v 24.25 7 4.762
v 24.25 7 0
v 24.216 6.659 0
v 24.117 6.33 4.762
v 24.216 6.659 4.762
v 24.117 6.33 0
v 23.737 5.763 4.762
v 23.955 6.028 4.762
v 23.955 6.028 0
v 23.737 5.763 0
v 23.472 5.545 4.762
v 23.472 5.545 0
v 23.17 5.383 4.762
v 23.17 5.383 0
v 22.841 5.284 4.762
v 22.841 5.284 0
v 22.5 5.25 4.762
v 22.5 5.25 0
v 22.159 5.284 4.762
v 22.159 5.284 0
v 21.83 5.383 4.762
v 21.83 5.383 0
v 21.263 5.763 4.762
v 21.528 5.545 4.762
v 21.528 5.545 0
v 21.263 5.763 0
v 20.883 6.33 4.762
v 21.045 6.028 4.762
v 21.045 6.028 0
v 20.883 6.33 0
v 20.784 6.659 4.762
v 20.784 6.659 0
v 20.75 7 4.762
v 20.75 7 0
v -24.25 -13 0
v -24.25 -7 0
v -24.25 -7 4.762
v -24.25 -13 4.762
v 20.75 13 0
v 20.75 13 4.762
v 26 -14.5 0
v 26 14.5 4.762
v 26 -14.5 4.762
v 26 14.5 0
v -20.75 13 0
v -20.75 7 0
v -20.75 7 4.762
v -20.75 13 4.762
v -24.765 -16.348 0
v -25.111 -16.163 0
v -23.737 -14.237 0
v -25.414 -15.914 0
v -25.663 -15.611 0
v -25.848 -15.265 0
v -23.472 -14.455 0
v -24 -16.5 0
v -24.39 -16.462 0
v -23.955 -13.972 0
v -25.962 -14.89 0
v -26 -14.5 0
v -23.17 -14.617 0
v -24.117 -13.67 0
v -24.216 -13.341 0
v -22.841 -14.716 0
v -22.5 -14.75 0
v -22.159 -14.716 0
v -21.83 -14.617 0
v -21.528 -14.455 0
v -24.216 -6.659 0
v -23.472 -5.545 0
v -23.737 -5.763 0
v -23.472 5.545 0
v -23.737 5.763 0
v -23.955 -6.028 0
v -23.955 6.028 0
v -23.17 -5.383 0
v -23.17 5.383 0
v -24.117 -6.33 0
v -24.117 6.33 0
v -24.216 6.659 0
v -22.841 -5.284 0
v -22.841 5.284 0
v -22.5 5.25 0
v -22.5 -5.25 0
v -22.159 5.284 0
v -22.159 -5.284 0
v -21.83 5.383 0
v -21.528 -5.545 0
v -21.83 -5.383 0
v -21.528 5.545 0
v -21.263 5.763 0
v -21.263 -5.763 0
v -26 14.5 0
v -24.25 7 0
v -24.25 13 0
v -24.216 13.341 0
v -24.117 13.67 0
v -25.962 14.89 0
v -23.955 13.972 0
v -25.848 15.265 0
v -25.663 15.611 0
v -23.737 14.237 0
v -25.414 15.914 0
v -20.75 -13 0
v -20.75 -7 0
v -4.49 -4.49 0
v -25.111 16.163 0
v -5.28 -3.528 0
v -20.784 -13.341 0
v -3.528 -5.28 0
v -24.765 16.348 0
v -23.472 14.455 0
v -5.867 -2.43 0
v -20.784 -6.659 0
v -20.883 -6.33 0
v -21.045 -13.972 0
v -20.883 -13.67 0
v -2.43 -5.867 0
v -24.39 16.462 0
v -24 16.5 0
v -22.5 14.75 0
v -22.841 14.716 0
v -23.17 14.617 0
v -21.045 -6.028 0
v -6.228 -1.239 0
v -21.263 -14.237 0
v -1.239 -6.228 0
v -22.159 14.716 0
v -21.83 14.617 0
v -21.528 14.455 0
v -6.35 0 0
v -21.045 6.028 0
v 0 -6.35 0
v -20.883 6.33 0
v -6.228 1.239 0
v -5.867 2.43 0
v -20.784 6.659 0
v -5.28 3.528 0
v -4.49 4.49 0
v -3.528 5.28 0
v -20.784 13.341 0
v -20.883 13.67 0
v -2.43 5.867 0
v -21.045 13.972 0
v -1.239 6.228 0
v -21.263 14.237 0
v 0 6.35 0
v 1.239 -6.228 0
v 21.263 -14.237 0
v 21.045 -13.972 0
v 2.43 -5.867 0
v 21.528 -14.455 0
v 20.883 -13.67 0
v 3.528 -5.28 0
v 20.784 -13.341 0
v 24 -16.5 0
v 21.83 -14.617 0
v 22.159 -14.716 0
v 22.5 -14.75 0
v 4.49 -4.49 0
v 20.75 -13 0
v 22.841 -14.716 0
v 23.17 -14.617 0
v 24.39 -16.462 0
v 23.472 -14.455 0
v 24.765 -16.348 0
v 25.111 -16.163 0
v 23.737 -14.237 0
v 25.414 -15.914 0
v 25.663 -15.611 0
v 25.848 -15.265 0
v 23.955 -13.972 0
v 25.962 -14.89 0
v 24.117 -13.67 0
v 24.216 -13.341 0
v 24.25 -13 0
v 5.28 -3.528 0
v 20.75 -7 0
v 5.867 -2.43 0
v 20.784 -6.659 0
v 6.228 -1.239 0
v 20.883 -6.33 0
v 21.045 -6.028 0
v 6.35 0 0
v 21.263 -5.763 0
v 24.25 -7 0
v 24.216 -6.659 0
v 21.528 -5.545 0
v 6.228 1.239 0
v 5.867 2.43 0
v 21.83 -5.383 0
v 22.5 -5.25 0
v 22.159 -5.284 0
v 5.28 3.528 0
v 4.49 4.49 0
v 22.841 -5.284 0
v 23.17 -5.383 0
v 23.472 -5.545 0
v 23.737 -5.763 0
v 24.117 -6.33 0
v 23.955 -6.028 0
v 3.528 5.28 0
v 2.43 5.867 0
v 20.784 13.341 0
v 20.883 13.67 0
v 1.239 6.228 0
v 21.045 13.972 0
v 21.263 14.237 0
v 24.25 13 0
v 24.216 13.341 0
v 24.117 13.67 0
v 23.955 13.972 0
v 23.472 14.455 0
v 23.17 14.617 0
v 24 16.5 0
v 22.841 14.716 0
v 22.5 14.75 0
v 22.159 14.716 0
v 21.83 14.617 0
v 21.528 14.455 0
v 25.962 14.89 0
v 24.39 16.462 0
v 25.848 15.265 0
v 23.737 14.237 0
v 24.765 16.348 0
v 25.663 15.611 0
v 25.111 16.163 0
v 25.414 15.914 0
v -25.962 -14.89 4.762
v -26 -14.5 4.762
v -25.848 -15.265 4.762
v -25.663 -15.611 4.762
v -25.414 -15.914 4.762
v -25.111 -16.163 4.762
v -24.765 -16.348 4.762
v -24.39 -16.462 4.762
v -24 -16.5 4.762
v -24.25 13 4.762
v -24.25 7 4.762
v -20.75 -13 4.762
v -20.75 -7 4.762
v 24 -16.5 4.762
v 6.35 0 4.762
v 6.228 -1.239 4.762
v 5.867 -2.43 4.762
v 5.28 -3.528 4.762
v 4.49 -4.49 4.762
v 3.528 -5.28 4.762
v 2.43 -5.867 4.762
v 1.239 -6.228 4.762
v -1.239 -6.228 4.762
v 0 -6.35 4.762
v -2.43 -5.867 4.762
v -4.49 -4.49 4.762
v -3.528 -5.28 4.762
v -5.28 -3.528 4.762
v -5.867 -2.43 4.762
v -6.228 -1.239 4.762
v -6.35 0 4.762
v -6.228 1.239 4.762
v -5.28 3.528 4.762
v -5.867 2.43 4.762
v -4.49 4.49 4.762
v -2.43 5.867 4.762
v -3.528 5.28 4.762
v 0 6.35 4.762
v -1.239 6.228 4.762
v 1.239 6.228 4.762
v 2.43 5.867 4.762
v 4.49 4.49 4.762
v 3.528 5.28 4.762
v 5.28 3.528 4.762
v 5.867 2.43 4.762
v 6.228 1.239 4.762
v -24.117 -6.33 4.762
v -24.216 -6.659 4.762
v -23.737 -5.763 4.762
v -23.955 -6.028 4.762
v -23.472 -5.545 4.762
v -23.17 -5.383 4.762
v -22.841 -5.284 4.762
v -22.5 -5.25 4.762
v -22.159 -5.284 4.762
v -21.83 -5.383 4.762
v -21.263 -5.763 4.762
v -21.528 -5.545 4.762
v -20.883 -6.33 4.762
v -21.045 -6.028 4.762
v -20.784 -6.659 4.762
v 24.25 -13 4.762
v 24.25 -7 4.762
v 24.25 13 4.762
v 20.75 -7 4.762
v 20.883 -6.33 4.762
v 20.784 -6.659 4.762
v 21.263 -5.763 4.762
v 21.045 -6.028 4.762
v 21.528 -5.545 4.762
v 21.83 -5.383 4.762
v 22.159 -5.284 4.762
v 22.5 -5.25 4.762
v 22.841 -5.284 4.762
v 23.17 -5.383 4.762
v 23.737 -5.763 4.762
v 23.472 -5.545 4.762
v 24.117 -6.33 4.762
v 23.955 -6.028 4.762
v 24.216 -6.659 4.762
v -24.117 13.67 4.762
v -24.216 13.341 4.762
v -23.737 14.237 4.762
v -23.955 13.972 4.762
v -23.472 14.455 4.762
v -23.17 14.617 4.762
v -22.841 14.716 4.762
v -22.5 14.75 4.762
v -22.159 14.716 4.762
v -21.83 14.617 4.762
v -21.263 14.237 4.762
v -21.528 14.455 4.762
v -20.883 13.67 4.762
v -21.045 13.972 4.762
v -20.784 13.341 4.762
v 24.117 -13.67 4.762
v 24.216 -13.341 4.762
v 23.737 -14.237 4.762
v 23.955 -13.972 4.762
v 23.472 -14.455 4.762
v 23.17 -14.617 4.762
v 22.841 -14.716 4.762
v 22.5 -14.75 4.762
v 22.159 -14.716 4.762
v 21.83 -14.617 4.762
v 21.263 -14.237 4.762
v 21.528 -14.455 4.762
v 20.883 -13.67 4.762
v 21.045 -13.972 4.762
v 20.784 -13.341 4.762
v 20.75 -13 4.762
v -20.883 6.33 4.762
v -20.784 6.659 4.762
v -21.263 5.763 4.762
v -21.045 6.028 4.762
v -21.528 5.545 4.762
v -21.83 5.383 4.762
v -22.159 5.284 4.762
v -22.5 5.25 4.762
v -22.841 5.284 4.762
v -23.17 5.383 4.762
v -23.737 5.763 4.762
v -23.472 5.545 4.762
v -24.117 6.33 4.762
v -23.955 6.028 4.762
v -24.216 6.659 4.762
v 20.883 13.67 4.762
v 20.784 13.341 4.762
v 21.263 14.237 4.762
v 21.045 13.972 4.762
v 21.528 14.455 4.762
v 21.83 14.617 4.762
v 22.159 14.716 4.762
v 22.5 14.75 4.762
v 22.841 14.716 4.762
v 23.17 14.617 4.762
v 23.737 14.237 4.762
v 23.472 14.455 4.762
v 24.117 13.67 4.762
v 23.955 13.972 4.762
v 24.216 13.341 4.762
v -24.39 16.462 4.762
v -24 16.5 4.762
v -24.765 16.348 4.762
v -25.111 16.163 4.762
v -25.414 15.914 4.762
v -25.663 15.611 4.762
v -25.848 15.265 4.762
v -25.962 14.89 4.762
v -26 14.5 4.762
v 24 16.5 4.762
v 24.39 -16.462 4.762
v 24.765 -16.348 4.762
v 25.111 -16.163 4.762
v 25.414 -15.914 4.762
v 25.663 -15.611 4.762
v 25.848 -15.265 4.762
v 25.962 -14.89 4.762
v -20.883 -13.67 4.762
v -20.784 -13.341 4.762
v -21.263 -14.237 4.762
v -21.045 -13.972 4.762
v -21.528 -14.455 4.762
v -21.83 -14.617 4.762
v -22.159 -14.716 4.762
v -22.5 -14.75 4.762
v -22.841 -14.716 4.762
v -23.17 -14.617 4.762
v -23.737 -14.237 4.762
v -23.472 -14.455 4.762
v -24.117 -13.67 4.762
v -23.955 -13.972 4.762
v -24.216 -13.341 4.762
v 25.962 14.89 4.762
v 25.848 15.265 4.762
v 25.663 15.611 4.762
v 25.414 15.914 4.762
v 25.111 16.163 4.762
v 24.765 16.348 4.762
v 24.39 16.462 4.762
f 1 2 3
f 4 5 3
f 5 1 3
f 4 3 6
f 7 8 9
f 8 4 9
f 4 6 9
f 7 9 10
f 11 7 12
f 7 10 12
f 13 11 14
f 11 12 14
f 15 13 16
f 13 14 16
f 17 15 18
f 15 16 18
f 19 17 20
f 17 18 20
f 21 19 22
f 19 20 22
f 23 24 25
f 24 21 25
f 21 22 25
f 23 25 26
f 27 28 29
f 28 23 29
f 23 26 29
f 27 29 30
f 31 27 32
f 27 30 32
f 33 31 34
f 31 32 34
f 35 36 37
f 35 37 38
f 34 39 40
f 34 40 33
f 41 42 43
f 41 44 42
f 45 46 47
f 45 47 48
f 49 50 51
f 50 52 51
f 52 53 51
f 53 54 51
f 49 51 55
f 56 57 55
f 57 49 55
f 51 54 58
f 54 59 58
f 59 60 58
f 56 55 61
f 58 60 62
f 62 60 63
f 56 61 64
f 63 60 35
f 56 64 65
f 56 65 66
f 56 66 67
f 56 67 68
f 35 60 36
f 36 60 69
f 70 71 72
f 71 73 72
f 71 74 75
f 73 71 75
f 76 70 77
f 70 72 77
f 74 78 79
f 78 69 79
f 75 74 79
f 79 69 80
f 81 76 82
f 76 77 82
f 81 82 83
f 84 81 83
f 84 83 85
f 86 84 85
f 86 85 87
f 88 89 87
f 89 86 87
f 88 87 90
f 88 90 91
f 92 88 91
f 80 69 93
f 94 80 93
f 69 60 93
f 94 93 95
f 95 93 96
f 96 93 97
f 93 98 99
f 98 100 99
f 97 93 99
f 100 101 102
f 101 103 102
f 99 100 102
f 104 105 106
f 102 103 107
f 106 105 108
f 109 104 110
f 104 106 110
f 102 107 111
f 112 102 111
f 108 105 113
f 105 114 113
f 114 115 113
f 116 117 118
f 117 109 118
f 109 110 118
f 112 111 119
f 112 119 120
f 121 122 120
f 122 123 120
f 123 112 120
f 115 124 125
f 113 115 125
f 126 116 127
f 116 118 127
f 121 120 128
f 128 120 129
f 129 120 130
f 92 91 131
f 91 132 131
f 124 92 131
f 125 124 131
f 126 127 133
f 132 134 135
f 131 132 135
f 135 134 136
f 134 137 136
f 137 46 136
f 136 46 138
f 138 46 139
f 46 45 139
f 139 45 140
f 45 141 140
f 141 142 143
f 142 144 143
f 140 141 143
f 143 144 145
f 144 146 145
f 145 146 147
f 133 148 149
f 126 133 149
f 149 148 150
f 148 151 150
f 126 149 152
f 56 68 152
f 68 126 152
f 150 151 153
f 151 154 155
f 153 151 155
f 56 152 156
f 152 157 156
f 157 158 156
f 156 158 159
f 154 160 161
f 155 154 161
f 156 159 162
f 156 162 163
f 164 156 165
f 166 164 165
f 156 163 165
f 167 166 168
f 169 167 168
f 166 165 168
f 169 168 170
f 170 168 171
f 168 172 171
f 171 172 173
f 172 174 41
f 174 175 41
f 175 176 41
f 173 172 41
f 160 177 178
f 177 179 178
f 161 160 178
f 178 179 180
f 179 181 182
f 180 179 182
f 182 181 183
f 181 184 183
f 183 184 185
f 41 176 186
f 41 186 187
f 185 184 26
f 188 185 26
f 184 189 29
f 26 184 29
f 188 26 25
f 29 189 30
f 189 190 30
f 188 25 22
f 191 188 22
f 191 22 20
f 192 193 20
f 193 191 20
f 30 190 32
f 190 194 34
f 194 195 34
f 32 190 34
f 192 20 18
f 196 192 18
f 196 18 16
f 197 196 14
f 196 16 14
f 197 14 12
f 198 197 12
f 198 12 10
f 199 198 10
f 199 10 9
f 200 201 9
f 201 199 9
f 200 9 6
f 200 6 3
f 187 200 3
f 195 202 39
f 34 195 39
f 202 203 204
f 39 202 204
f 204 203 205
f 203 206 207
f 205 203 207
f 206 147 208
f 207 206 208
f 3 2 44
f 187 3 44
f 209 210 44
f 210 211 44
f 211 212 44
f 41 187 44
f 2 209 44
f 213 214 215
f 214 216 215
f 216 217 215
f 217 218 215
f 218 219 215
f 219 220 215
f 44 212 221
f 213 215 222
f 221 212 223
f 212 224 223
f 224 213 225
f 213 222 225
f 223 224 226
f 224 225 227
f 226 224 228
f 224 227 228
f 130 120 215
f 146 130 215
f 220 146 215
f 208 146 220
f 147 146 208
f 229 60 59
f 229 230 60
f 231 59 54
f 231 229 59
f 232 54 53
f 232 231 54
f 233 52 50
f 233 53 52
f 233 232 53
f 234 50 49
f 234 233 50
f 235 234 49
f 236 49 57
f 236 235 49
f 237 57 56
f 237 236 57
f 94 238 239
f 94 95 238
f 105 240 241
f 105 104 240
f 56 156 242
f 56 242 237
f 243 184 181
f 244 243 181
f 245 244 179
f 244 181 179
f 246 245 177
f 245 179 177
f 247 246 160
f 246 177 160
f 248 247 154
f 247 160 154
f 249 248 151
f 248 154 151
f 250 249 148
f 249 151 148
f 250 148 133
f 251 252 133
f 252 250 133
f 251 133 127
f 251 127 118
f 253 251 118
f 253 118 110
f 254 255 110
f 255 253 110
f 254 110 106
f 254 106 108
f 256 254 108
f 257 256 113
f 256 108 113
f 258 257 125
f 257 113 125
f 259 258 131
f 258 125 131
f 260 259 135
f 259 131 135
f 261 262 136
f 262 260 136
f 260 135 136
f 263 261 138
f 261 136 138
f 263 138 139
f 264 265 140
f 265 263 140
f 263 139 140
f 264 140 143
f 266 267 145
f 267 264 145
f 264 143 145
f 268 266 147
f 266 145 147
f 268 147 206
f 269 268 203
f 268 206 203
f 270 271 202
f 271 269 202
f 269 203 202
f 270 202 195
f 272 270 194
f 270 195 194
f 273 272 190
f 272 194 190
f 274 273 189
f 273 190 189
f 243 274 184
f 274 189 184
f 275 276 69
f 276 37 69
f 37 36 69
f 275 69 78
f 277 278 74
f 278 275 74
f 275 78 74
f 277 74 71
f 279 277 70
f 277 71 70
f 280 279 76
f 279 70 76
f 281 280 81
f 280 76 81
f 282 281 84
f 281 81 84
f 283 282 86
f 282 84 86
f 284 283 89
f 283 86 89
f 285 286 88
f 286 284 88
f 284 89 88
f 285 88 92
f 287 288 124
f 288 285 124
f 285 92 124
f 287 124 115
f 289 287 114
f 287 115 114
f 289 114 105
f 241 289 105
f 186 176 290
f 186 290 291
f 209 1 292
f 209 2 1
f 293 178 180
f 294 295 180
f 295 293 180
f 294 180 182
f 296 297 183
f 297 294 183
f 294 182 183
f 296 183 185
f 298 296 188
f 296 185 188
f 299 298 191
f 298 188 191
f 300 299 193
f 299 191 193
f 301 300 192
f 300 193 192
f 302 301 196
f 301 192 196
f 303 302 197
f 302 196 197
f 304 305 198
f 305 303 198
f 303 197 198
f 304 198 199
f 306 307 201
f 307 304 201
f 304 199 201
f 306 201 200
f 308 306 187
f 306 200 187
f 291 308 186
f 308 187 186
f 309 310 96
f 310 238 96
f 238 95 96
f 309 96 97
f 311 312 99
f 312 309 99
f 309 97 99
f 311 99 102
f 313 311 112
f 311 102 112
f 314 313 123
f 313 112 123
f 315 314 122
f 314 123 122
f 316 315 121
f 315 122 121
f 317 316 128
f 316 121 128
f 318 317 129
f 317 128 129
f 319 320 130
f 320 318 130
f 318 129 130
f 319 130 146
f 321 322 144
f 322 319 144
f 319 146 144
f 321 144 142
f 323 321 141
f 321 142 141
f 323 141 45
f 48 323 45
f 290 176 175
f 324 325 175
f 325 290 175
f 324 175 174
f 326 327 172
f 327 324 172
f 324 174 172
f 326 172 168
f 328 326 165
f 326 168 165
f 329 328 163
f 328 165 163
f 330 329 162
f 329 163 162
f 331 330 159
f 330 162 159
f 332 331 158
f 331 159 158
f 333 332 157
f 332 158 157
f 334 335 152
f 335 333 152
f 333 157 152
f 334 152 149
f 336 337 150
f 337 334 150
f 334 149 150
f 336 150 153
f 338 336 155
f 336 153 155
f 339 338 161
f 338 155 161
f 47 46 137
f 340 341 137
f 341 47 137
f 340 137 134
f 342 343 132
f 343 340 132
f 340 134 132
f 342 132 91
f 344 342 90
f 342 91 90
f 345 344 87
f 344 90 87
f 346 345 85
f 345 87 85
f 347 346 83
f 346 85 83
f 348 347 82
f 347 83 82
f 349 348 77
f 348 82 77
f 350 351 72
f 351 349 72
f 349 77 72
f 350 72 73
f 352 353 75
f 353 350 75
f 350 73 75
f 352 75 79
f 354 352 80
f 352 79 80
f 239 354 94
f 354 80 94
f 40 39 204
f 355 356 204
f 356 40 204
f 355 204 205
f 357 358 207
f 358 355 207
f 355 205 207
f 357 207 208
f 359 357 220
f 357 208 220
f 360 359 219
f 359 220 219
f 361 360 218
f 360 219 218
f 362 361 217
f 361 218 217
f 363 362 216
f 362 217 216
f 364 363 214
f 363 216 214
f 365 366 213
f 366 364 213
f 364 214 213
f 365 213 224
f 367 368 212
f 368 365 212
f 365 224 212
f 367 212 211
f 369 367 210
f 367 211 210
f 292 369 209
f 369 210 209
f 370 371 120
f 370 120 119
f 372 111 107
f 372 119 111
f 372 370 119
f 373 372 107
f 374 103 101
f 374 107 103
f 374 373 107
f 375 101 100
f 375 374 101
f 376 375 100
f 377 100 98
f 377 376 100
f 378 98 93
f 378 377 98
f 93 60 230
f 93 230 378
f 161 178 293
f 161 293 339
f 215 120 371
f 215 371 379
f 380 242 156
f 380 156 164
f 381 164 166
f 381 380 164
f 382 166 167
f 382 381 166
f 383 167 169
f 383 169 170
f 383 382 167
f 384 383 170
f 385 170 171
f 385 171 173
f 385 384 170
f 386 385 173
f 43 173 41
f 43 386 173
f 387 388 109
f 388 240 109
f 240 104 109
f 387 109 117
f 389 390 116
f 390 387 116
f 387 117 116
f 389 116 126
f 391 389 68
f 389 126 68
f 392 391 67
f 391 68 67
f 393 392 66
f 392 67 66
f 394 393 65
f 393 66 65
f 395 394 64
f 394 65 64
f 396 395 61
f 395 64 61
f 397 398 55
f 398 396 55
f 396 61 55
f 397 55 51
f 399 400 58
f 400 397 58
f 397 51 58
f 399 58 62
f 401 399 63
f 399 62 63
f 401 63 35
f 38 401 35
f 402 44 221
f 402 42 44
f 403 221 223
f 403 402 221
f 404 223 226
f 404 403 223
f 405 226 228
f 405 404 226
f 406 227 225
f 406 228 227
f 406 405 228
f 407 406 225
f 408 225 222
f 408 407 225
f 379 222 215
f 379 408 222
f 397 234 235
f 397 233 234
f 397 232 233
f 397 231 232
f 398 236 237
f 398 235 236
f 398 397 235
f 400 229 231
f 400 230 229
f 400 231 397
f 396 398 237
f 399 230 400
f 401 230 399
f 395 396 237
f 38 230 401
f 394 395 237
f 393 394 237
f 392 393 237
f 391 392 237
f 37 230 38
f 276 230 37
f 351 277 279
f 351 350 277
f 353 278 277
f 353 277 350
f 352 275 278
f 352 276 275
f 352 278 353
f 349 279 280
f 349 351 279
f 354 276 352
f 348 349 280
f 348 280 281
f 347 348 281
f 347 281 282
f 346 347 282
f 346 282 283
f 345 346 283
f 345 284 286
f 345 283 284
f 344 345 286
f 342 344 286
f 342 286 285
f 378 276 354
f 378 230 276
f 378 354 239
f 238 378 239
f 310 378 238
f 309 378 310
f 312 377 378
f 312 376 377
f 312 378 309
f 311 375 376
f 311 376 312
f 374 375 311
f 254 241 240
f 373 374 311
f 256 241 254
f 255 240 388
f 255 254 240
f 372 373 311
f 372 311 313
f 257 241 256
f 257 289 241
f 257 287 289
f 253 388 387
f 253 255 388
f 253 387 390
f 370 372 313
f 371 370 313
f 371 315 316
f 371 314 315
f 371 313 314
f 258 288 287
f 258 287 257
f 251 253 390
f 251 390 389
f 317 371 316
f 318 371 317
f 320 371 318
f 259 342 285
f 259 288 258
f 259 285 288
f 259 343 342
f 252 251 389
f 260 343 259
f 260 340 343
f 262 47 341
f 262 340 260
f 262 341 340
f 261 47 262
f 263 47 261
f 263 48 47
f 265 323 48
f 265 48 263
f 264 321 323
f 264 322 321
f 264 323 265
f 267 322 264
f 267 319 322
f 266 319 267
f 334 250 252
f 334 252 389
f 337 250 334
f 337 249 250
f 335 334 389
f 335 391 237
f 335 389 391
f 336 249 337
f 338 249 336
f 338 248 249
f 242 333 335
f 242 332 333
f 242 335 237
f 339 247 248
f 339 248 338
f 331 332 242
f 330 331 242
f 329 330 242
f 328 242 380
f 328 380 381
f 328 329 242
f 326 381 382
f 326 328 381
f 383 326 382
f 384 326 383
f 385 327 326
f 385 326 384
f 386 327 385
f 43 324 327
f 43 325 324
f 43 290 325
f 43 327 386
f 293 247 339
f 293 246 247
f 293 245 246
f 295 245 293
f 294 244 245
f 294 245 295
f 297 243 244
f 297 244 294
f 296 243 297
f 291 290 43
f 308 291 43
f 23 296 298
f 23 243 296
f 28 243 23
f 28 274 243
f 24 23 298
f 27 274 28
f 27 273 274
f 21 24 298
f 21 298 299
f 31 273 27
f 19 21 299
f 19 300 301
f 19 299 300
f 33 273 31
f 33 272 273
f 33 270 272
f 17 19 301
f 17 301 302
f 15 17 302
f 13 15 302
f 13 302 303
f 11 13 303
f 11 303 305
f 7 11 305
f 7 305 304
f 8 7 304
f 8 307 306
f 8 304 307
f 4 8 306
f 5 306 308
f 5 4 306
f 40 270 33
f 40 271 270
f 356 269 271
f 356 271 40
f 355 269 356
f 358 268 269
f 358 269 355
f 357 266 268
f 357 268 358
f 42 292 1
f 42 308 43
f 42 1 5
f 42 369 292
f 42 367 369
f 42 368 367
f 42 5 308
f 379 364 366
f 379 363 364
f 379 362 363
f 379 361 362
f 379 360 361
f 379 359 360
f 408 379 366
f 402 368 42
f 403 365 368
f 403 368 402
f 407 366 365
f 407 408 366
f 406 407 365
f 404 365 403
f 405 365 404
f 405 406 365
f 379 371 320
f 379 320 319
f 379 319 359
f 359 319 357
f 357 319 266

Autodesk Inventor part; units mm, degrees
ref_plane "YZ Plane" through (0, 0, 0) normal (1, 0, 0) x (0, 1, 0)
ref_plane "XZ Plane" through (0, 0, 0) normal (0, 1, 0) x (-1, 0, 0)
ref_plane "XY Plane" through (0, 0, 0) normal (0, 0, 1) x (1, 0, 0)
sketch "Sketch1" plane through (0, 0, 0) normal (0, 0, 1) x (1, 0, 0)
  line L0 (22.5, -10) -> (-22.5, -10) construction
  line L1 (-22.5, -10) -> (-22.5, 10) construction
  line L2 (-22.5, 10) -> (22.5, 10) construction
  line L3 (22.5, 10) -> (22.5, -10) construction
  line L4 (22.5, -10) -> (-22.5, 10) construction
  line L5 (-22.5, -10) -> (22.5, 10) construction
  line L6 (-22.5, 13) -> (-22.5, 7) construction
  line L7 (-24.25, 13) -> (-24.25, 7)
  line L8 (-20.75, 7) -> (-20.75, 13)
  arc A0 (-20.75, 13) -> (-24.25, 13) centre (-22.5, 13) ccw
  arc A1 (-24.25, 7) -> (-20.75, 7) centre (-22.5, 7) ccw
  line L9 (-22.5, -13) -> (-22.5, -7) construction
  line L10 (-20.75, -13) -> (-20.75, -7)
  line L11 (-24.25, -7) -> (-24.25, -13)
  arc A2 (-24.25, -13) -> (-20.75, -13) centre (-22.5, -13) ccw
  arc A3 (-20.75, -7) -> (-24.25, -7) centre (-22.5, -7) ccw
  line L12 (22.5, 13) -> (22.5, 7) construction
  line L13 (20.75, 13) -> (20.75, 7)
  line L14 (24.25, 7) -> (24.25, 13)
  arc A4 (24.25, 13) -> (20.75, 13) centre (22.5, 13) ccw
  arc A5 (20.75, 7) -> (24.25, 7) centre (22.5, 7) ccw
  line L15 (22.5, -13) -> (22.5, -7) construction
  line L16 (24.25, -13) -> (24.25, -7)
  line L17 (20.75, -7) -> (20.75, -13)
  arc A6 (20.75, -13) -> (24.25, -13) centre (22.5, -13) ccw
  arc A7 (24.25, -7) -> (20.75, -7) centre (22.5, -7) ccw
  line L18 (26, -16.5) -> (-26, -16.5)
  line L19 (-26, -16.5) -> (-26, 16.5)
  line L20 (-26, 16.5) -> (26, 16.5)
  line L21 (26, 16.5) -> (26, -16.5)
  line L22 (26, -16.5) -> (-26, 16.5) construction
  line L23 (-26, -16.5) -> (26, 16.5) construction
  circle A8 centre (0, 0) radius 6.35
  dimension "d0" = 45
  dimension "d1" = 20
  dimension "d2" = 3.5
  dimension "d3" = 6
  dimension "d4" = 52
  dimension "d5" = 33
  dimension "d6" = 12.7
extrude "Extrusion1" add sketch "Sketch1" along normal blind 4.7625
fillet "Fillet1" radius 2 4 edges at (-26, 16.5, 2.3813) (26, 16.5, 2.3813) (26, -16.5, 2.3813) (-26, -16.5, 2.3813)
properties part number "belt tensioner"
